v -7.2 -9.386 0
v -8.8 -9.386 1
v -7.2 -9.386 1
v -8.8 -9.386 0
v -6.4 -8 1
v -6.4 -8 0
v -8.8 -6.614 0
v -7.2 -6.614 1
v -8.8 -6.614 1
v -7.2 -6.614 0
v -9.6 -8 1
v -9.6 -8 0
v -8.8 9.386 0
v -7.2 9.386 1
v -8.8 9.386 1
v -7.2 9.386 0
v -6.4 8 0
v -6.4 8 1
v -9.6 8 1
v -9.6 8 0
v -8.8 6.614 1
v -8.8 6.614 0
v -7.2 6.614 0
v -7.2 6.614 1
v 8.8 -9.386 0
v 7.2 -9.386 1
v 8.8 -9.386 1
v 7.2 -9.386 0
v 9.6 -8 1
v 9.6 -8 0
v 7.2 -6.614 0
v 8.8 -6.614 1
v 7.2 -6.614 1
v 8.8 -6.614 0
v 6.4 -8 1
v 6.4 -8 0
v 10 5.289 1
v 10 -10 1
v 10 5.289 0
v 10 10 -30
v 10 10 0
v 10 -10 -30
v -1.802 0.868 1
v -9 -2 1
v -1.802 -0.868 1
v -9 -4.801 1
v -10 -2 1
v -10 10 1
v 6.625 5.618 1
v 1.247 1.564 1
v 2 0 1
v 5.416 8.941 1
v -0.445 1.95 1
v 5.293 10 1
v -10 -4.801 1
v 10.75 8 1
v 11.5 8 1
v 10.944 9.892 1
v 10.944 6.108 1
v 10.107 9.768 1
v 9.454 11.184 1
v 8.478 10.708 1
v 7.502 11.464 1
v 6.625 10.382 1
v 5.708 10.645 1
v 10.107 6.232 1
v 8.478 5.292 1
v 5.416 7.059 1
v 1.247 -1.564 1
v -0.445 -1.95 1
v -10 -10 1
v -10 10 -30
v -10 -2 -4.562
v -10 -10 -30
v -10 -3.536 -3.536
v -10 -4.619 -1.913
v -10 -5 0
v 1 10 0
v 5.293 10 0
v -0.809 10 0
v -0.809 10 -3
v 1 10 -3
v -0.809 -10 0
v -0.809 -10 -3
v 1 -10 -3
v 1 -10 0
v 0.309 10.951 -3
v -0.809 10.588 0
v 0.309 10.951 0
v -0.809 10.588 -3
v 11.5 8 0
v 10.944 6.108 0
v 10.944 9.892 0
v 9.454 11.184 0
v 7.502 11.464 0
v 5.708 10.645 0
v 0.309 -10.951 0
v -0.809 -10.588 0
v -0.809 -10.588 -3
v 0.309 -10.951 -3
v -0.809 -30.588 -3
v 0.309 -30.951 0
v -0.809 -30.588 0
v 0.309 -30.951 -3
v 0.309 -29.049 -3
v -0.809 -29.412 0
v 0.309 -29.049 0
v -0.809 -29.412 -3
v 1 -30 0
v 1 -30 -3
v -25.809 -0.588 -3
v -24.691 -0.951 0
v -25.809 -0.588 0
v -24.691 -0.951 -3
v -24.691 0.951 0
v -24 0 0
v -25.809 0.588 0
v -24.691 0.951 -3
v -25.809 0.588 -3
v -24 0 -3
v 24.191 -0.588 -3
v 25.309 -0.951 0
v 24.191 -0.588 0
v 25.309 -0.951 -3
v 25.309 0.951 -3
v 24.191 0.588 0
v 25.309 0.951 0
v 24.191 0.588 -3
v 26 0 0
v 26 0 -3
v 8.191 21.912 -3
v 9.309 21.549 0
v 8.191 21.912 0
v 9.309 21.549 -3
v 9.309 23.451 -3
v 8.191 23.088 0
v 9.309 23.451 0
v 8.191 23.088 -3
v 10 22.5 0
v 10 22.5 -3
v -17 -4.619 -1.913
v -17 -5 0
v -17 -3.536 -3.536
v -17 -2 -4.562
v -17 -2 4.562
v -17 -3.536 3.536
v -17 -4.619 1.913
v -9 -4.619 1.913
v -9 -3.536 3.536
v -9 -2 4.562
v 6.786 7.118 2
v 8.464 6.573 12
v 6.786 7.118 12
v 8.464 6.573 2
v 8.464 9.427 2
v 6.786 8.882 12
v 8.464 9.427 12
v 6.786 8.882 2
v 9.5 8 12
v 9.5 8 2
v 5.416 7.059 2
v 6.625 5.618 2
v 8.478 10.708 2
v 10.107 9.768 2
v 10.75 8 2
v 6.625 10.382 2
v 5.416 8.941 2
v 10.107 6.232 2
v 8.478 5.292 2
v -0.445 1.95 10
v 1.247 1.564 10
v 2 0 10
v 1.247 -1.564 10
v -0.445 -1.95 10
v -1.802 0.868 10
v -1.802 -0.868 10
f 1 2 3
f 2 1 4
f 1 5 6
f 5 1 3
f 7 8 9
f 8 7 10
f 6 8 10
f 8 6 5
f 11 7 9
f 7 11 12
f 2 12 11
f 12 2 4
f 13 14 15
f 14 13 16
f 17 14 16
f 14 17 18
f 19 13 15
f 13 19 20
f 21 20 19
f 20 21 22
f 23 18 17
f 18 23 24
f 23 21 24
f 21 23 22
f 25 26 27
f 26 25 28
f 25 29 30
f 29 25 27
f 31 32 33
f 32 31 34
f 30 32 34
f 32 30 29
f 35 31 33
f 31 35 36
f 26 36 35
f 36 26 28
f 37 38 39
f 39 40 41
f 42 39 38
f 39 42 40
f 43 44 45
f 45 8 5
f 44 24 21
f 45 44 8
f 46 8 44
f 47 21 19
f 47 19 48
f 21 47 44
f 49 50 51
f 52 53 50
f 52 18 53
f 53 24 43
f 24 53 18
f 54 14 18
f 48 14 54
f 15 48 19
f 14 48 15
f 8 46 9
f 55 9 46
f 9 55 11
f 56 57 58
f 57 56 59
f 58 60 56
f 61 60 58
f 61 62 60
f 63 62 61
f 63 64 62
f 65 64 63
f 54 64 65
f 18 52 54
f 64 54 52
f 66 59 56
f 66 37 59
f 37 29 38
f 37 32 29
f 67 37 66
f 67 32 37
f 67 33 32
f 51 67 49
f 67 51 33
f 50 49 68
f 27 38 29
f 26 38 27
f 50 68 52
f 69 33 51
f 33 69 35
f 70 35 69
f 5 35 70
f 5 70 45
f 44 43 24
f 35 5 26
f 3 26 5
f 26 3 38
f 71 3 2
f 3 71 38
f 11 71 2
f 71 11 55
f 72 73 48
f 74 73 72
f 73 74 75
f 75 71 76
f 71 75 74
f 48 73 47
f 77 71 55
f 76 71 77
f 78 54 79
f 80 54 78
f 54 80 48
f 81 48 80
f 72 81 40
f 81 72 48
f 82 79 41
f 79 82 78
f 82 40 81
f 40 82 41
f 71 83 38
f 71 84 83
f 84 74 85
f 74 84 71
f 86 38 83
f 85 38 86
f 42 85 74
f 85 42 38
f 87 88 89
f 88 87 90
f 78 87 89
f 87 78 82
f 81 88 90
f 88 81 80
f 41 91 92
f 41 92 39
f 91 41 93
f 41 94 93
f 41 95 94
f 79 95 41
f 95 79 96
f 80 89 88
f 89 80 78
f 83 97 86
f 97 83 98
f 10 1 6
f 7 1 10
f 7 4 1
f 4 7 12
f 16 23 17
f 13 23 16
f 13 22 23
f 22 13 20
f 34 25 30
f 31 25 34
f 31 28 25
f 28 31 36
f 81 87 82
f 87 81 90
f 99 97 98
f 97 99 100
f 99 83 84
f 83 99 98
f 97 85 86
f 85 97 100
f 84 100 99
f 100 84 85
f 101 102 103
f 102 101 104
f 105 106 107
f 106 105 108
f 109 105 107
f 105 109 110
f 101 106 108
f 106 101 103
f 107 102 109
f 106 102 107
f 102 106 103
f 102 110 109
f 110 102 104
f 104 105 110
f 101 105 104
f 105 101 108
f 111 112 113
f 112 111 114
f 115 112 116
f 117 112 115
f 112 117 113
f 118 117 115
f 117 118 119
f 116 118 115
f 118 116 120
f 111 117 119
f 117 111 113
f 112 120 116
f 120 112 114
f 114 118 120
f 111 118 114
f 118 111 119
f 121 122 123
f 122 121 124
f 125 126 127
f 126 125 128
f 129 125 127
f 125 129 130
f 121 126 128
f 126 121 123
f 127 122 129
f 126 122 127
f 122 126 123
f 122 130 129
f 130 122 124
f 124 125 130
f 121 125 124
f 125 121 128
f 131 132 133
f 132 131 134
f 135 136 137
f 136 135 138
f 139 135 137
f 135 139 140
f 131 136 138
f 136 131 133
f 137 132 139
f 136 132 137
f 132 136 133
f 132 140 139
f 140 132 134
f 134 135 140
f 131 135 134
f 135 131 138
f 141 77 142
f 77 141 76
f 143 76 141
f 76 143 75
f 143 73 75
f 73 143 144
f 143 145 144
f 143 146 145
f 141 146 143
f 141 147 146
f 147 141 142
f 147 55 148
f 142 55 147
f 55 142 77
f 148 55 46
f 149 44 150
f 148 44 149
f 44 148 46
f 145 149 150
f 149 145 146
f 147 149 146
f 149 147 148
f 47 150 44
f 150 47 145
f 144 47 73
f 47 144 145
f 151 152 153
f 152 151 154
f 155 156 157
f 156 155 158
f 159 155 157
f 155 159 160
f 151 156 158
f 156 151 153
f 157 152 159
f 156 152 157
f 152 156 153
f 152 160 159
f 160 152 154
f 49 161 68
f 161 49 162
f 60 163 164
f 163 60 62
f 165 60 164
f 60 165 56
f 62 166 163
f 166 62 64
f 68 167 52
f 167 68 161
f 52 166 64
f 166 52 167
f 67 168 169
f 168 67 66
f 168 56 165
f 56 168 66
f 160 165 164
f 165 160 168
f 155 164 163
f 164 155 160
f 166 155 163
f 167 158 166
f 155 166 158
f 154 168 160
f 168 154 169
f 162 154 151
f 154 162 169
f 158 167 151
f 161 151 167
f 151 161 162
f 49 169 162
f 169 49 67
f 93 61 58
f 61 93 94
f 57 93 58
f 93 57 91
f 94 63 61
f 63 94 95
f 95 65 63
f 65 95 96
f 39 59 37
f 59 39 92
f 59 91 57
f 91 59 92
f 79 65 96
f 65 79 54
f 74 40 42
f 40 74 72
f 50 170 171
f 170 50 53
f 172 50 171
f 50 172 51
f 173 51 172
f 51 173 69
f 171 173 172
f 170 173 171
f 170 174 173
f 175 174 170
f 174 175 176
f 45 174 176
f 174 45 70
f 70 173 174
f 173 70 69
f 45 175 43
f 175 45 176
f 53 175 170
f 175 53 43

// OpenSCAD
// Parameters
face_width = 20.0; //[10.0:40.0:0.5]
body_length = 30.0; //[15.0:60.0:0.5]
body_width = 20.0; //[10.0:40.0:0.5]
body_height = 20.0; //[10.0:40.0:0.5]
front_face_thickness = 2.0; //[1.0:6.0:0.25]
shaft_diameter = 4.0; //[2.0:10.0:0.25]
shaft_length = 10.0; //[5.0:25.0:0.5]
mounting_hole_spacing = 16.0; //[8.0:32.0:0.5]
mounting_hole_diameter = 3.0; //[2.0:6.0:0.25]
overlap = 1.0; //[0.5:2.0:0.1]
hole_clearance = 0.2; //[0.0:0.6:0.05]
mount_hole_depth_extra = 2.0; //[1.0:6.0:0.5]
screw_length = 12.0; //[6.0:30.0:0.5]
screw_head_diameter = 5.5; //[3.0:12.0:0.25]
washer_diameter = 7.0; //[4.0:16.0:0.25]
washer_thickness = 1.0; //[0.5:3.0:0.1]
pattern_post_diameter = 2.0; //[1.0:6.0:0.25]
pattern_post_height = 3.0; //[1.0:10.0:0.5]
ttrack_length = 40.0; //[20.0:120.0:1.0]
ttrack_pitch = 20.0; //[10.0:40.0:1.0]
rail_length = 50.0; //[20.0:150.0:1.0]
rail_pitch = 25.0; //[10.0:50.0:1.0]
rail_hole_count = 3.0; //[2.0:8.0:1.0]
insert_length = 30.0; //[15.0:80.0:1.0]
insert_pitch = 15.0; //[8.0:30.0:1.0]
d_plug_diameter = 10.0; //[6.0:20.0:0.5]
d_plug_length = 8.0; //[4.0:20.0:0.5]
d_flat_depth = 2.0; //[0.5:5.0:0.25]

// Modules
module motor_body() {
  color("Black") {
    translate([0, 0, -(front_face_thickness/2 + body_length/2 - overlap)])
      cube([body_width, body_height, body_length], center=true);
  }
}

module front_face_with_mounting_holes() {
  color("DimGray") {
    difference() {
      translate([0, 0, 0])
        cube([face_width, face_width, front_face_thickness], center=true);
      union() {
        for (x = [-1, 1])
          for (y = [-1, 1])
            translate([x * mounting_hole_spacing/2, y * mounting_hole_spacing/2, 0])
              cylinder(r=(mounting_hole_diameter + hole_clearance)/2, h=front_face_thickness + mount_hole_depth_extra, center=true);
      }
    }
  }
}

module output_shaft() {
  color("Silver") {
    translate([0, 0, front_face_thickness/2 + shaft_length/2 - overlap])
      cylinder(r=shaft_diameter/2, h=shaft_length, center=true);
  }
}

module screw_and_washer() {
  color("Silver") {
    union() {
      translate([mounting_hole_spacing/2, mounting_hole_spacing/2, front_face_thickness/2 + screw_length/2 - overlap])
        cylinder(r=mounting_hole_diameter/2, h=screw_length, center=true);
      translate([mounting_hole_spacing/2, mounting_hole_spacing/2, front_face_thickness/2 + washer_thickness - overlap])
        cylinder(r=screw_head_diameter/2, h=washer_thickness*2, center=true);
      translate([mounting_hole_spacing/2, mounting_hole_spacing/2, front_face_thickness/2 + washer_thickness/2 - overlap])
        cylinder(r=washer_diameter/2, h=washer_thickness, center=true);
    }
  }
}

module ttrack_hole_positions() {
  color("Blue") {
    union() {
      for (i = [0:2])
        translate([0, ttrack_length/2 - ((ttrack_length - (floor(ttrack_length/ttrack_pitch) - 1) * ttrack_pitch)/2 + i*ttrack_pitch), -front_face_thickness/2 - pattern_post_height/2 + overlap])
          cylinder(r=pattern_post_diameter/2, h=pattern_post_height, center=true);
    }
  }
}

module rail_hole_positions() {
  color("Green") {
    union() {
      for (i = [0:rail_hole_count-1])
        translate([-rail_length/2 + (rail_length - (rail_hole_count - 1) * rail_pitch)/2 + i*rail_pitch, 0, -front_face_thickness/2 - pattern_post_height/2 + overlap])
          cylinder(r=pattern_post_diameter/2, h=pattern_post_height, center=true);
    }
  }
}

module ttrack_insert_hole_positions() {
  color("Red") {
    union() {
      for (i = [0:2])
        translate([face_width/2 - pattern_post_diameter/2, -insert_length/2 + (insert_length - (floor(insert_length/insert_pitch) - 1) * insert_pitch)/2 + i*insert_pitch, -front_face_thickness/2 - pattern_post_height/2 + overlap])
          cylinder(r=pattern_post_diameter/2, h=pattern_post_height, center=true);
    }
  }
}

module d_plug_D() {
  color("Yellow") {
    difference() {
      translate([-face_width/2 - d_plug_length/2 + overlap, 0, 0])
        rotate([0, 90, 0])
        cylinder(r=d_plug_diameter/2, h=d_plug_length, center=true);
      translate([-face_width/2 - d_plug_length/2 + overlap, d_plug_diameter/2 - d_flat_depth, 0])
        rotate([0, 90, 0])
        cube([d_plug_length + 2*overlap, d_plug_diameter, d_plug_diameter], center=true);
    }
  }
}

module assembly() {
  motor_body();
  front_face_with_mounting_holes();
  output_shaft();
  ttrack_hole_positions();
  rail_hole_positions();
  ttrack_insert_hole_positions();
  d_plug_D();
  screw_and_washer();
}

assembly();
